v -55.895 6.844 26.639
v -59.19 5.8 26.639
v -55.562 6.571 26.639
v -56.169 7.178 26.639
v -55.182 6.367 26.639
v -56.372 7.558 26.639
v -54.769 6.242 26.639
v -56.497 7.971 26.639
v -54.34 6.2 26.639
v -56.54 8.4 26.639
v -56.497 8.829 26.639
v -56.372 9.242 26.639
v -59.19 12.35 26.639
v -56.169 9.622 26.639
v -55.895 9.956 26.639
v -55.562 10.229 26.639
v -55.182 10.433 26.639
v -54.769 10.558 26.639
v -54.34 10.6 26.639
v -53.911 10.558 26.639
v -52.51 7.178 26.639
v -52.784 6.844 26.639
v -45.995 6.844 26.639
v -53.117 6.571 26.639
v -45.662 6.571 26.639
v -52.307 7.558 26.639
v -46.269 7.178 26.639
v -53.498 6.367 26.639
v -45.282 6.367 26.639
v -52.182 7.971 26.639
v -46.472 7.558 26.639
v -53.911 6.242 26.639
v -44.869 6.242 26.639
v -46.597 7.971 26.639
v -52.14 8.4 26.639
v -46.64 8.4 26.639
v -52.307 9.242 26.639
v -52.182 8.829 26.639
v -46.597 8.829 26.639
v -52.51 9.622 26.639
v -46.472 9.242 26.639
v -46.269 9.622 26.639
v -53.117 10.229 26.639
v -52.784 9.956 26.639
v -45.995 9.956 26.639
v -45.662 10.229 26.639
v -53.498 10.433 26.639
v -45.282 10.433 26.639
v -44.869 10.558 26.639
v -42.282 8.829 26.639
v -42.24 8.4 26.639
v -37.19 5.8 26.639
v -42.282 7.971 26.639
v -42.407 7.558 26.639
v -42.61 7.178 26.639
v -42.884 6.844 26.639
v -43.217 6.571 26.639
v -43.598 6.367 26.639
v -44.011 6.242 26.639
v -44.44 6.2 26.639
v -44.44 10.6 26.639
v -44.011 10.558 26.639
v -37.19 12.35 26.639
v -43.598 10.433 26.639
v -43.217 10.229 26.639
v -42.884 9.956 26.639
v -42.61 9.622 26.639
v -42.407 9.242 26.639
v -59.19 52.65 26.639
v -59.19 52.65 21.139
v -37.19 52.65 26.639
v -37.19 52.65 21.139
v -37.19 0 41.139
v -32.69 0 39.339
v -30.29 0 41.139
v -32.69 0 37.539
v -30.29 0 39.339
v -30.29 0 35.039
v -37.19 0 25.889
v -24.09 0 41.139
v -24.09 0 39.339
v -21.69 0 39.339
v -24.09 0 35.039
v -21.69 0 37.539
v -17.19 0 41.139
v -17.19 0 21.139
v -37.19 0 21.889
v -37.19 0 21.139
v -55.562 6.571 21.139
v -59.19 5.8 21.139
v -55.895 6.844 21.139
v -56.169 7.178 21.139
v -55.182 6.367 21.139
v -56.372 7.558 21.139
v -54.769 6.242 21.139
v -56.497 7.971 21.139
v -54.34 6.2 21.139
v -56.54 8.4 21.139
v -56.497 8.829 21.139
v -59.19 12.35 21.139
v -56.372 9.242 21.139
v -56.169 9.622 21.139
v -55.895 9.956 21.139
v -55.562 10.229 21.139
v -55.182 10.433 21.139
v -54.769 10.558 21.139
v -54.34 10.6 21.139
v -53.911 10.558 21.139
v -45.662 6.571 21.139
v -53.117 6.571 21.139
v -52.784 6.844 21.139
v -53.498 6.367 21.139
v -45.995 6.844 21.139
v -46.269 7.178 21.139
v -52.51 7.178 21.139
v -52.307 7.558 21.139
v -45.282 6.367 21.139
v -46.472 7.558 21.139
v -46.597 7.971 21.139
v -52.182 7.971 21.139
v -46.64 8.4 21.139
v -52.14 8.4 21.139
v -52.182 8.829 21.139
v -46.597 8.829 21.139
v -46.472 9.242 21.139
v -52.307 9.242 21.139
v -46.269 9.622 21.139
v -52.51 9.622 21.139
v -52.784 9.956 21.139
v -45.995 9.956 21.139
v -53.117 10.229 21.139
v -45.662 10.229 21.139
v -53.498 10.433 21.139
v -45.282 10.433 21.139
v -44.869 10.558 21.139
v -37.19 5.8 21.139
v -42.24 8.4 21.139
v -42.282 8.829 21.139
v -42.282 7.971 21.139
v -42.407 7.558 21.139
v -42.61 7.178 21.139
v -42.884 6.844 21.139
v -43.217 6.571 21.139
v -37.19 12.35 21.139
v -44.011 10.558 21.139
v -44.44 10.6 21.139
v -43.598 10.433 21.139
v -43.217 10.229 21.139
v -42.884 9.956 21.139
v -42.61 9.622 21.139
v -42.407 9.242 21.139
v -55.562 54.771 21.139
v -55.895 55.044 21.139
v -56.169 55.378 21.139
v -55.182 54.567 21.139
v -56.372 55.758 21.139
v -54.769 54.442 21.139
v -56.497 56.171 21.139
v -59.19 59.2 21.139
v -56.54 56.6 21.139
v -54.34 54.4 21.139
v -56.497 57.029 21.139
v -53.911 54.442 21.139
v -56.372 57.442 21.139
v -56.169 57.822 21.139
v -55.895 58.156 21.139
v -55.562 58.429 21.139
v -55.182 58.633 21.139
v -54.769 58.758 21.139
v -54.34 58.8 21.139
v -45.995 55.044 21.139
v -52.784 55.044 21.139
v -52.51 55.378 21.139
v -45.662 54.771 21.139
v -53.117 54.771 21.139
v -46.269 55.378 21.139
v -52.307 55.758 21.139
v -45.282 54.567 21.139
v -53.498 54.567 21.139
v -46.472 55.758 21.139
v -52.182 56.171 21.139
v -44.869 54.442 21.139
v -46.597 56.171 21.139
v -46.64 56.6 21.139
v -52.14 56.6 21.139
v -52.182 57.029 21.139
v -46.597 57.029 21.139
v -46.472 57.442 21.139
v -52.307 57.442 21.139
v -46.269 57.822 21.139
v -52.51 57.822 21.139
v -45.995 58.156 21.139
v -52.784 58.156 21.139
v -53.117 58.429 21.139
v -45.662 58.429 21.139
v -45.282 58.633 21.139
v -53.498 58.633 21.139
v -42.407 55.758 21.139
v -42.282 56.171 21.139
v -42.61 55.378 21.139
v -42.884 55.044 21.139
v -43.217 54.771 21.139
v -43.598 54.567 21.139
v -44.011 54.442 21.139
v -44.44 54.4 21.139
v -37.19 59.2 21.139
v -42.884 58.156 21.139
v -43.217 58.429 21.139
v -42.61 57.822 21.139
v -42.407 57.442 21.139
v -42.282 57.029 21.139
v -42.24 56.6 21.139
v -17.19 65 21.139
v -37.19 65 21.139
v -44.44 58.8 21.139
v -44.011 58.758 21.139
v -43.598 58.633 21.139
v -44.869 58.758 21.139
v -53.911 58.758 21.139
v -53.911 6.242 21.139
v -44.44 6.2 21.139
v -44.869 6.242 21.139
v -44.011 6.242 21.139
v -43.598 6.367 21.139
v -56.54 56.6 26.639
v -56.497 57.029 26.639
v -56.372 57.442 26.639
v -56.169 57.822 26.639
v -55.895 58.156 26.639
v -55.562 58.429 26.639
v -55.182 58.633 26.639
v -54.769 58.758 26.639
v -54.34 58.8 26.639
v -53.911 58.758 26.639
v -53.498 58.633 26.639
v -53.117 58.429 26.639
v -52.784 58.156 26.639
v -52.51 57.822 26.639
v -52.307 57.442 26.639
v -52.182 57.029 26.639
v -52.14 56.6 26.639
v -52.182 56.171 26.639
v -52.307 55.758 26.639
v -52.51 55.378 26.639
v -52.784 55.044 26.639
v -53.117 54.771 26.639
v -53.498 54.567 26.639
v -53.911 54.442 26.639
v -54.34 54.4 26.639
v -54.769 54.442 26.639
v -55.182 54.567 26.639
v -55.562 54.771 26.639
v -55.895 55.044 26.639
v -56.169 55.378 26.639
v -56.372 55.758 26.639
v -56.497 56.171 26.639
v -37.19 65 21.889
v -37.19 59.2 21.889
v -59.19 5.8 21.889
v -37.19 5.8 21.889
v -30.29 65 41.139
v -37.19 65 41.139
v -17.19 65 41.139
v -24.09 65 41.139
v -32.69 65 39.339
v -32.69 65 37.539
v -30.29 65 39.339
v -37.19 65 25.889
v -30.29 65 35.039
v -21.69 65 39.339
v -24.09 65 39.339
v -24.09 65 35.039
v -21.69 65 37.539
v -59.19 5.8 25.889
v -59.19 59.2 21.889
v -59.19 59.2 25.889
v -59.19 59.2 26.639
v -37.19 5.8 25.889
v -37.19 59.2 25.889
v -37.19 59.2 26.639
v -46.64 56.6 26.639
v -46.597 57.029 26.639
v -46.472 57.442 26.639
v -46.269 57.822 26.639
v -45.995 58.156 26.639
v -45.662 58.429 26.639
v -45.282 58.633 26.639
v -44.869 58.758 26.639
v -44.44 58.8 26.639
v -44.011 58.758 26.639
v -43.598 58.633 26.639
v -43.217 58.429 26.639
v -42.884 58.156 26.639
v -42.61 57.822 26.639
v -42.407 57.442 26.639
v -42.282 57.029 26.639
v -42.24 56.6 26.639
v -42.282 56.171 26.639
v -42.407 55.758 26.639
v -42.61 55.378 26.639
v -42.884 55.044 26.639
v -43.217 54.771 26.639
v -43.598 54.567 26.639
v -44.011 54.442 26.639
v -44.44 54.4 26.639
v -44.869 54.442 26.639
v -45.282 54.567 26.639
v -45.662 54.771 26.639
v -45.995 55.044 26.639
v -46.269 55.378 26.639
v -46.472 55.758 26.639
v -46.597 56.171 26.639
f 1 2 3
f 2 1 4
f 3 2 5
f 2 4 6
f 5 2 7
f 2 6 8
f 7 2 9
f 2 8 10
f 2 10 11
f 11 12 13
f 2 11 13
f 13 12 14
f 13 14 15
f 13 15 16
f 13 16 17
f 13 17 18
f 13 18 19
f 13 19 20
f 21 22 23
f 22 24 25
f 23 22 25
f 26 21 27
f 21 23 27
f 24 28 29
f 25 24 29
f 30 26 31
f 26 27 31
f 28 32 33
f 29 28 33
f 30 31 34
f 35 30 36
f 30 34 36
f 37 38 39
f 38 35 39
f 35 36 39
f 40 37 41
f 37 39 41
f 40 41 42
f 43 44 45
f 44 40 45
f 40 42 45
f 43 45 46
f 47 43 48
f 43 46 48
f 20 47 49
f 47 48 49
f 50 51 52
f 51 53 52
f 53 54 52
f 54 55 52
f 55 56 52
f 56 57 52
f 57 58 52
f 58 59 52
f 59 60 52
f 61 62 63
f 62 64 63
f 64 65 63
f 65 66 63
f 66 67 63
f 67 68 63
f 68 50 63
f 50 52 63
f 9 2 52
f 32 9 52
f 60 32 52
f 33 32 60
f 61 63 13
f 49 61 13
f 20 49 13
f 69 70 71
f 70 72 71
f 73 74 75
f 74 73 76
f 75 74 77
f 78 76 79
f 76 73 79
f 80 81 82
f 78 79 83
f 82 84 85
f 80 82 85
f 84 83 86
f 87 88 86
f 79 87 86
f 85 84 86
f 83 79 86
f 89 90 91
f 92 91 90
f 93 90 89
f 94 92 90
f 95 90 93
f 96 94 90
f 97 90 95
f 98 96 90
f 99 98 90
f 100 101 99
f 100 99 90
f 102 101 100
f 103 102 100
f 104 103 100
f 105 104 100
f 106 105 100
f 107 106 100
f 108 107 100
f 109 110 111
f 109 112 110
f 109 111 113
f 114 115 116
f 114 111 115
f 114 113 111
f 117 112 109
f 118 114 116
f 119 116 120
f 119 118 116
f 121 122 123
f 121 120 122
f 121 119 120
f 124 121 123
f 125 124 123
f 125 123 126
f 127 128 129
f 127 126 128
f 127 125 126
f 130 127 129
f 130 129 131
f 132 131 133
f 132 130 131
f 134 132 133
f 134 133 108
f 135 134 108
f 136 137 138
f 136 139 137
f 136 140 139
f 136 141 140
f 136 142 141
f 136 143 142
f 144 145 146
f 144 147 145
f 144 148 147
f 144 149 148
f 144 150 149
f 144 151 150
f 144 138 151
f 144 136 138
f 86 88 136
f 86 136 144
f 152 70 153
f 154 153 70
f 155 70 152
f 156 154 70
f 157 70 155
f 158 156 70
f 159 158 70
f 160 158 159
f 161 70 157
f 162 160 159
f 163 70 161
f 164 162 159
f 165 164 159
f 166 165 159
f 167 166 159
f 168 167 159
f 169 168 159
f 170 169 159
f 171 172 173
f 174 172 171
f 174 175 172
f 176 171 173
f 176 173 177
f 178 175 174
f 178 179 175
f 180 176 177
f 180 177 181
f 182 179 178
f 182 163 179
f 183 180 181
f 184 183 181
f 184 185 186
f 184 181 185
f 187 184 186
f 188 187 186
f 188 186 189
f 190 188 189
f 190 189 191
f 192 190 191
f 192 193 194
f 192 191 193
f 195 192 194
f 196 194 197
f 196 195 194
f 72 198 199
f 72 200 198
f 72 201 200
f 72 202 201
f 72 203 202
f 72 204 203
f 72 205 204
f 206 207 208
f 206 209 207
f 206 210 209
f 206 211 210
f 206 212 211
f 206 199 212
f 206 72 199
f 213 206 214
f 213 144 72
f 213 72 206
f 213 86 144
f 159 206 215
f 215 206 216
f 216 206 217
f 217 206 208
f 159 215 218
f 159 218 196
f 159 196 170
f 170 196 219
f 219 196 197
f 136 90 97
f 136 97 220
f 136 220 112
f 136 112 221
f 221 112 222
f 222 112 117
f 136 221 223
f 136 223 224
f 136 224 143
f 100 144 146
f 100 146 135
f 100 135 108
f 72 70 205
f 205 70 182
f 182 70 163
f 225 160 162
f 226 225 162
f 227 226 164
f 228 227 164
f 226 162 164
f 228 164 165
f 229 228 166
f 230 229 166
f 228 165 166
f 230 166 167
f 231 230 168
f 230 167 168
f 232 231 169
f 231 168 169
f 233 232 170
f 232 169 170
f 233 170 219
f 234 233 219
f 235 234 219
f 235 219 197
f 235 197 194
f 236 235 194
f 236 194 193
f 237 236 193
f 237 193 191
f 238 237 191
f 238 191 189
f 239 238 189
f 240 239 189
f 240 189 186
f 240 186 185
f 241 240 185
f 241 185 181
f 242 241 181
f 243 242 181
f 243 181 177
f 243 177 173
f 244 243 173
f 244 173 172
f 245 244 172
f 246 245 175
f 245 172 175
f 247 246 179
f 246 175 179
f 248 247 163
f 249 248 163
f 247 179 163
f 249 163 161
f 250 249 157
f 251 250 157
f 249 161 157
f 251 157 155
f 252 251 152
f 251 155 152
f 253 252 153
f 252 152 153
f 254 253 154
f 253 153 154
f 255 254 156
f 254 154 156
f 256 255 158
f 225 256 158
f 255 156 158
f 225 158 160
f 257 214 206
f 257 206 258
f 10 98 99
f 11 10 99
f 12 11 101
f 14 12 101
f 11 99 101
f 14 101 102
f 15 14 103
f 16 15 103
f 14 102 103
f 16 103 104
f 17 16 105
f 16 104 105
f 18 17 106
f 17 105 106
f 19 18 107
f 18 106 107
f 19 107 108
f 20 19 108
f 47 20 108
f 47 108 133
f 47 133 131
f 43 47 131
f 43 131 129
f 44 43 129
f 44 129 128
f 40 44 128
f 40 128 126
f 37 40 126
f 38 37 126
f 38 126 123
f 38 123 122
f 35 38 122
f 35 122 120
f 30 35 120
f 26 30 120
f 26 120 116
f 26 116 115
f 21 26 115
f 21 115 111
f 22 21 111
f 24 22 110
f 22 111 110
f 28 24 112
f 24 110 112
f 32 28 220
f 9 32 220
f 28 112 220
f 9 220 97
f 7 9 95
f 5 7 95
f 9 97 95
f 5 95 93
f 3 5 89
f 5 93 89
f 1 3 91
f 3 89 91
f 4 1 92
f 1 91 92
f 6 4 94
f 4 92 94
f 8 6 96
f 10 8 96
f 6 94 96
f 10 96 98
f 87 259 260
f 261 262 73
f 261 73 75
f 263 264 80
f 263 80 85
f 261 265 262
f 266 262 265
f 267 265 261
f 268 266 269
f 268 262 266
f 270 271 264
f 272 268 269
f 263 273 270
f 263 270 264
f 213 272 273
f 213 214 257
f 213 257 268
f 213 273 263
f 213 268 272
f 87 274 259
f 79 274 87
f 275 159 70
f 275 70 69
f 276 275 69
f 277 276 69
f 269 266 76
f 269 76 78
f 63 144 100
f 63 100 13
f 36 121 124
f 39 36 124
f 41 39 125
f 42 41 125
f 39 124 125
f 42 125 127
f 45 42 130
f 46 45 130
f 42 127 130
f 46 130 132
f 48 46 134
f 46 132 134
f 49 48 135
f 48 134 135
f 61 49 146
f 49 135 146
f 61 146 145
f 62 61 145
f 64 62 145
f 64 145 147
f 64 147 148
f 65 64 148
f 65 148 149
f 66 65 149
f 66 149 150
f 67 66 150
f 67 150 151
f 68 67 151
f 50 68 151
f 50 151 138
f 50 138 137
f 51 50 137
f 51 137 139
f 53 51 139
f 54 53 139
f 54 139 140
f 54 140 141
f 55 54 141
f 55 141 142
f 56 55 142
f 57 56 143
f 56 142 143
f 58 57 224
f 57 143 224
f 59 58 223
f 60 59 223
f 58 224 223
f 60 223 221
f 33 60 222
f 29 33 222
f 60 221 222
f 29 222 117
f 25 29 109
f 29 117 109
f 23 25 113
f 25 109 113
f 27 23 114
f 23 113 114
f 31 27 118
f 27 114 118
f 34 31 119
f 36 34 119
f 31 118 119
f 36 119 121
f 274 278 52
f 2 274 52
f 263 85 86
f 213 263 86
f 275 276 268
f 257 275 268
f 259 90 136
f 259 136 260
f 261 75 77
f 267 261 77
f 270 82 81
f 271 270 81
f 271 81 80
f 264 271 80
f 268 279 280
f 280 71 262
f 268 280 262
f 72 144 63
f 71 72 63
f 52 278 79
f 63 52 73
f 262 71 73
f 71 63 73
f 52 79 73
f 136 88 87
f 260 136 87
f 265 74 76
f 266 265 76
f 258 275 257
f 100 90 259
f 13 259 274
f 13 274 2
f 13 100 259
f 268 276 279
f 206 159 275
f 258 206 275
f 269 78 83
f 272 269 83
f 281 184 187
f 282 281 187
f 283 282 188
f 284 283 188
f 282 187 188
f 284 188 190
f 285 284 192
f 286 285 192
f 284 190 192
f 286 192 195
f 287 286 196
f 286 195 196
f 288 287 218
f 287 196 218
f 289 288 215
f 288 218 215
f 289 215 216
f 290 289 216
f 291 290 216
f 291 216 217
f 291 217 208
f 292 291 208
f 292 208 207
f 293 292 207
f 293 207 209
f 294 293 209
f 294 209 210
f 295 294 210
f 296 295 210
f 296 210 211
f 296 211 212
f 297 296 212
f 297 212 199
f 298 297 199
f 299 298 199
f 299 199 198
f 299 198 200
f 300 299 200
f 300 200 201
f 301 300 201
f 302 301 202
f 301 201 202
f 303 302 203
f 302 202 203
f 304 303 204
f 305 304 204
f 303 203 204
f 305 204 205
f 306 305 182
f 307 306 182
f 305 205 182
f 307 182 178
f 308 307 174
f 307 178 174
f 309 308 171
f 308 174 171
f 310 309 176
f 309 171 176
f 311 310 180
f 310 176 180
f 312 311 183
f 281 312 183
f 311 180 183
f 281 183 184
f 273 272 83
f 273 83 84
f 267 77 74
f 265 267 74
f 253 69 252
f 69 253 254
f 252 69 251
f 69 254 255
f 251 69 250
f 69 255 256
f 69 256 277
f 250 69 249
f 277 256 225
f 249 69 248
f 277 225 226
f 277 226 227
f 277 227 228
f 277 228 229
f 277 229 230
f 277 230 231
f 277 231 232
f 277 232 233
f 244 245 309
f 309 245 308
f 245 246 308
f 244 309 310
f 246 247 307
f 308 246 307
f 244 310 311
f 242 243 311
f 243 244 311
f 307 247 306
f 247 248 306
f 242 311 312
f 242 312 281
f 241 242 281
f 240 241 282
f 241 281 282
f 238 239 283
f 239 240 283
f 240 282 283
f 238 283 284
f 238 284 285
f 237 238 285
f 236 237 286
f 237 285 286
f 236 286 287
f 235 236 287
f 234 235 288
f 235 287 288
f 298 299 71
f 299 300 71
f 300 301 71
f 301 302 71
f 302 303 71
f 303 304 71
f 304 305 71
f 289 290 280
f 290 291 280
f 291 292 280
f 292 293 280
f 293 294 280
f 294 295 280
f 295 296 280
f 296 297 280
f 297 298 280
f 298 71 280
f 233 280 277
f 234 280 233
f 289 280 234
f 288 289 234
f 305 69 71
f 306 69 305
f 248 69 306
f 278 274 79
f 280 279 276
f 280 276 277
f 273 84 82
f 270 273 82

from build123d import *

# Parameters (mm, degrees)
EXTRUDE_1_DEPTH     = 65
SKETCH_2_W          = 5.5
SKETCH_2_H          = 6.55
EXTRUDE_2_DEPTH     = 20
SKETCH_3_R          = 2.2
CUT_EXTRUDE_1_DEPTH = 20
SKETCH_4_W          = 5.5
SKETCH_4_H          = 6.55
EXTRUDE_3_DEPTH     = 2
RIB_7_REACH         = 67.469
SKETCH_5_WALL_W     = 155.689894758
SKETCH_5_WALL_H     = 4
RIB_8_REACH         = 76.607
SKETCH_6_WALL_W     = 173.96567711
SKETCH_6_WALL_H     = 4


with BuildPart() as part:
    # 草图1 → 凸台-拉伸1 (new body)
    with BuildSketch(Plane(origin=(0, 0, 0), x_dir=(1, 0, 0), z_dir=(0, 1, 0))):
        Polygon((-30.289732276, -35.038566896), (-24.089732276, -35.038566896), (-21.689732276, -37.538566896), (-21.689732276, -39.338566896), (-24.089732276, -39.338566896), (-24.089732276, -41.138566896), (-17.189732276, -41.138566896), (-17.189732276, -21.138566896), (-37.189732276, -21.138566896), (-37.189732276, -41.138566896), (-30.289732276, -41.138566896), (-30.289732276, -39.338566896), (-32.689732276, -39.338566896), (-32.689732276, -37.538566896), align=None)
    extrude(amount=EXTRUDE_1_DEPTH)

    # 草图2 → 凸台-拉伸2 (add)
    with BuildSketch(Plane.ZY.offset(37.189732276)):
        with Locations((23.888566896, 9.075)):
            Rectangle(SKETCH_2_W, SKETCH_2_H)
        with Locations((23.888566896, 55.925)):
            Rectangle(SKETCH_2_W, SKETCH_2_H)
    extrude(amount=EXTRUDE_2_DEPTH)

    # 草图3 → 切除-拉伸1 (cut)
    with BuildSketch(Plane(origin=(0, 0, 21.138566896), x_dir=(-1, 0, 0), z_dir=(0, 0, -1))):
        with Locations((54.339732276, 56.6)):
            Circle(SKETCH_3_R)
        with Locations((44.439732276, 56.6)):
            Circle(SKETCH_3_R)
        with Locations((44.439732276, 8.4)):
            Circle(SKETCH_3_R)
        with Locations((54.339732276, 8.4)):
            Circle(SKETCH_3_R)
    extrude(amount=-CUT_EXTRUDE_1_DEPTH, mode=Mode.SUBTRACT)

    # 草图4 → 凸台-拉伸3 (add)
    with BuildSketch(Plane.ZY.offset(57.189732276)):
        with Locations((23.888566896, 55.925)):
            Rectangle(SKETCH_4_W, SKETCH_4_H)
        with Locations((23.888566896, 9.075)):
            Rectangle(SKETCH_4_W, SKETCH_4_H)
    extrude(amount=EXTRUDE_3_DEPTH)

    # 草图5 wall → 筋7 (add, up to next)
    with BuildSketch(Plane(origin=(-48.189732276, 62.1, 23.888566896), x_dir=(0.966960573226, 0.254925969305, 0), z_dir=(0.254925969305, -0.966960573226, 0)), mode=Mode.PRIVATE) as rib_7_sk1:
        Rectangle(SKETCH_5_WALL_W, SKETCH_5_WALL_H)
    rib_7_tool1 = extrude(rib_7_sk1.sketch, amount=RIB_7_REACH, mode=Mode.PRIVATE) - part.part
    add(rib_7_tool1.solids().sort_by_distance((-48.189732276, 62.1, 23.888566896))[0])

    # 草图6 wall → 筋8 (add, up to next)
    with BuildSketch(Plane(origin=(-48.189732276, 2.9, 23.888566896), x_dir=(0.966960573226, -0.254925969305, 0), z_dir=(-0.254925969305, -0.966960573226, 0)), mode=Mode.PRIVATE) as rib_8_sk1:
        Rectangle(SKETCH_6_WALL_W, SKETCH_6_WALL_H)
    rib_8_tool1 = extrude(rib_8_sk1.sketch, amount=-RIB_8_REACH, mode=Mode.PRIVATE) - part.part
    add(rib_8_tool1.solids().sort_by_distance((-48.189732276, 2.9, 23.888566896))[0])


solid = part.part
